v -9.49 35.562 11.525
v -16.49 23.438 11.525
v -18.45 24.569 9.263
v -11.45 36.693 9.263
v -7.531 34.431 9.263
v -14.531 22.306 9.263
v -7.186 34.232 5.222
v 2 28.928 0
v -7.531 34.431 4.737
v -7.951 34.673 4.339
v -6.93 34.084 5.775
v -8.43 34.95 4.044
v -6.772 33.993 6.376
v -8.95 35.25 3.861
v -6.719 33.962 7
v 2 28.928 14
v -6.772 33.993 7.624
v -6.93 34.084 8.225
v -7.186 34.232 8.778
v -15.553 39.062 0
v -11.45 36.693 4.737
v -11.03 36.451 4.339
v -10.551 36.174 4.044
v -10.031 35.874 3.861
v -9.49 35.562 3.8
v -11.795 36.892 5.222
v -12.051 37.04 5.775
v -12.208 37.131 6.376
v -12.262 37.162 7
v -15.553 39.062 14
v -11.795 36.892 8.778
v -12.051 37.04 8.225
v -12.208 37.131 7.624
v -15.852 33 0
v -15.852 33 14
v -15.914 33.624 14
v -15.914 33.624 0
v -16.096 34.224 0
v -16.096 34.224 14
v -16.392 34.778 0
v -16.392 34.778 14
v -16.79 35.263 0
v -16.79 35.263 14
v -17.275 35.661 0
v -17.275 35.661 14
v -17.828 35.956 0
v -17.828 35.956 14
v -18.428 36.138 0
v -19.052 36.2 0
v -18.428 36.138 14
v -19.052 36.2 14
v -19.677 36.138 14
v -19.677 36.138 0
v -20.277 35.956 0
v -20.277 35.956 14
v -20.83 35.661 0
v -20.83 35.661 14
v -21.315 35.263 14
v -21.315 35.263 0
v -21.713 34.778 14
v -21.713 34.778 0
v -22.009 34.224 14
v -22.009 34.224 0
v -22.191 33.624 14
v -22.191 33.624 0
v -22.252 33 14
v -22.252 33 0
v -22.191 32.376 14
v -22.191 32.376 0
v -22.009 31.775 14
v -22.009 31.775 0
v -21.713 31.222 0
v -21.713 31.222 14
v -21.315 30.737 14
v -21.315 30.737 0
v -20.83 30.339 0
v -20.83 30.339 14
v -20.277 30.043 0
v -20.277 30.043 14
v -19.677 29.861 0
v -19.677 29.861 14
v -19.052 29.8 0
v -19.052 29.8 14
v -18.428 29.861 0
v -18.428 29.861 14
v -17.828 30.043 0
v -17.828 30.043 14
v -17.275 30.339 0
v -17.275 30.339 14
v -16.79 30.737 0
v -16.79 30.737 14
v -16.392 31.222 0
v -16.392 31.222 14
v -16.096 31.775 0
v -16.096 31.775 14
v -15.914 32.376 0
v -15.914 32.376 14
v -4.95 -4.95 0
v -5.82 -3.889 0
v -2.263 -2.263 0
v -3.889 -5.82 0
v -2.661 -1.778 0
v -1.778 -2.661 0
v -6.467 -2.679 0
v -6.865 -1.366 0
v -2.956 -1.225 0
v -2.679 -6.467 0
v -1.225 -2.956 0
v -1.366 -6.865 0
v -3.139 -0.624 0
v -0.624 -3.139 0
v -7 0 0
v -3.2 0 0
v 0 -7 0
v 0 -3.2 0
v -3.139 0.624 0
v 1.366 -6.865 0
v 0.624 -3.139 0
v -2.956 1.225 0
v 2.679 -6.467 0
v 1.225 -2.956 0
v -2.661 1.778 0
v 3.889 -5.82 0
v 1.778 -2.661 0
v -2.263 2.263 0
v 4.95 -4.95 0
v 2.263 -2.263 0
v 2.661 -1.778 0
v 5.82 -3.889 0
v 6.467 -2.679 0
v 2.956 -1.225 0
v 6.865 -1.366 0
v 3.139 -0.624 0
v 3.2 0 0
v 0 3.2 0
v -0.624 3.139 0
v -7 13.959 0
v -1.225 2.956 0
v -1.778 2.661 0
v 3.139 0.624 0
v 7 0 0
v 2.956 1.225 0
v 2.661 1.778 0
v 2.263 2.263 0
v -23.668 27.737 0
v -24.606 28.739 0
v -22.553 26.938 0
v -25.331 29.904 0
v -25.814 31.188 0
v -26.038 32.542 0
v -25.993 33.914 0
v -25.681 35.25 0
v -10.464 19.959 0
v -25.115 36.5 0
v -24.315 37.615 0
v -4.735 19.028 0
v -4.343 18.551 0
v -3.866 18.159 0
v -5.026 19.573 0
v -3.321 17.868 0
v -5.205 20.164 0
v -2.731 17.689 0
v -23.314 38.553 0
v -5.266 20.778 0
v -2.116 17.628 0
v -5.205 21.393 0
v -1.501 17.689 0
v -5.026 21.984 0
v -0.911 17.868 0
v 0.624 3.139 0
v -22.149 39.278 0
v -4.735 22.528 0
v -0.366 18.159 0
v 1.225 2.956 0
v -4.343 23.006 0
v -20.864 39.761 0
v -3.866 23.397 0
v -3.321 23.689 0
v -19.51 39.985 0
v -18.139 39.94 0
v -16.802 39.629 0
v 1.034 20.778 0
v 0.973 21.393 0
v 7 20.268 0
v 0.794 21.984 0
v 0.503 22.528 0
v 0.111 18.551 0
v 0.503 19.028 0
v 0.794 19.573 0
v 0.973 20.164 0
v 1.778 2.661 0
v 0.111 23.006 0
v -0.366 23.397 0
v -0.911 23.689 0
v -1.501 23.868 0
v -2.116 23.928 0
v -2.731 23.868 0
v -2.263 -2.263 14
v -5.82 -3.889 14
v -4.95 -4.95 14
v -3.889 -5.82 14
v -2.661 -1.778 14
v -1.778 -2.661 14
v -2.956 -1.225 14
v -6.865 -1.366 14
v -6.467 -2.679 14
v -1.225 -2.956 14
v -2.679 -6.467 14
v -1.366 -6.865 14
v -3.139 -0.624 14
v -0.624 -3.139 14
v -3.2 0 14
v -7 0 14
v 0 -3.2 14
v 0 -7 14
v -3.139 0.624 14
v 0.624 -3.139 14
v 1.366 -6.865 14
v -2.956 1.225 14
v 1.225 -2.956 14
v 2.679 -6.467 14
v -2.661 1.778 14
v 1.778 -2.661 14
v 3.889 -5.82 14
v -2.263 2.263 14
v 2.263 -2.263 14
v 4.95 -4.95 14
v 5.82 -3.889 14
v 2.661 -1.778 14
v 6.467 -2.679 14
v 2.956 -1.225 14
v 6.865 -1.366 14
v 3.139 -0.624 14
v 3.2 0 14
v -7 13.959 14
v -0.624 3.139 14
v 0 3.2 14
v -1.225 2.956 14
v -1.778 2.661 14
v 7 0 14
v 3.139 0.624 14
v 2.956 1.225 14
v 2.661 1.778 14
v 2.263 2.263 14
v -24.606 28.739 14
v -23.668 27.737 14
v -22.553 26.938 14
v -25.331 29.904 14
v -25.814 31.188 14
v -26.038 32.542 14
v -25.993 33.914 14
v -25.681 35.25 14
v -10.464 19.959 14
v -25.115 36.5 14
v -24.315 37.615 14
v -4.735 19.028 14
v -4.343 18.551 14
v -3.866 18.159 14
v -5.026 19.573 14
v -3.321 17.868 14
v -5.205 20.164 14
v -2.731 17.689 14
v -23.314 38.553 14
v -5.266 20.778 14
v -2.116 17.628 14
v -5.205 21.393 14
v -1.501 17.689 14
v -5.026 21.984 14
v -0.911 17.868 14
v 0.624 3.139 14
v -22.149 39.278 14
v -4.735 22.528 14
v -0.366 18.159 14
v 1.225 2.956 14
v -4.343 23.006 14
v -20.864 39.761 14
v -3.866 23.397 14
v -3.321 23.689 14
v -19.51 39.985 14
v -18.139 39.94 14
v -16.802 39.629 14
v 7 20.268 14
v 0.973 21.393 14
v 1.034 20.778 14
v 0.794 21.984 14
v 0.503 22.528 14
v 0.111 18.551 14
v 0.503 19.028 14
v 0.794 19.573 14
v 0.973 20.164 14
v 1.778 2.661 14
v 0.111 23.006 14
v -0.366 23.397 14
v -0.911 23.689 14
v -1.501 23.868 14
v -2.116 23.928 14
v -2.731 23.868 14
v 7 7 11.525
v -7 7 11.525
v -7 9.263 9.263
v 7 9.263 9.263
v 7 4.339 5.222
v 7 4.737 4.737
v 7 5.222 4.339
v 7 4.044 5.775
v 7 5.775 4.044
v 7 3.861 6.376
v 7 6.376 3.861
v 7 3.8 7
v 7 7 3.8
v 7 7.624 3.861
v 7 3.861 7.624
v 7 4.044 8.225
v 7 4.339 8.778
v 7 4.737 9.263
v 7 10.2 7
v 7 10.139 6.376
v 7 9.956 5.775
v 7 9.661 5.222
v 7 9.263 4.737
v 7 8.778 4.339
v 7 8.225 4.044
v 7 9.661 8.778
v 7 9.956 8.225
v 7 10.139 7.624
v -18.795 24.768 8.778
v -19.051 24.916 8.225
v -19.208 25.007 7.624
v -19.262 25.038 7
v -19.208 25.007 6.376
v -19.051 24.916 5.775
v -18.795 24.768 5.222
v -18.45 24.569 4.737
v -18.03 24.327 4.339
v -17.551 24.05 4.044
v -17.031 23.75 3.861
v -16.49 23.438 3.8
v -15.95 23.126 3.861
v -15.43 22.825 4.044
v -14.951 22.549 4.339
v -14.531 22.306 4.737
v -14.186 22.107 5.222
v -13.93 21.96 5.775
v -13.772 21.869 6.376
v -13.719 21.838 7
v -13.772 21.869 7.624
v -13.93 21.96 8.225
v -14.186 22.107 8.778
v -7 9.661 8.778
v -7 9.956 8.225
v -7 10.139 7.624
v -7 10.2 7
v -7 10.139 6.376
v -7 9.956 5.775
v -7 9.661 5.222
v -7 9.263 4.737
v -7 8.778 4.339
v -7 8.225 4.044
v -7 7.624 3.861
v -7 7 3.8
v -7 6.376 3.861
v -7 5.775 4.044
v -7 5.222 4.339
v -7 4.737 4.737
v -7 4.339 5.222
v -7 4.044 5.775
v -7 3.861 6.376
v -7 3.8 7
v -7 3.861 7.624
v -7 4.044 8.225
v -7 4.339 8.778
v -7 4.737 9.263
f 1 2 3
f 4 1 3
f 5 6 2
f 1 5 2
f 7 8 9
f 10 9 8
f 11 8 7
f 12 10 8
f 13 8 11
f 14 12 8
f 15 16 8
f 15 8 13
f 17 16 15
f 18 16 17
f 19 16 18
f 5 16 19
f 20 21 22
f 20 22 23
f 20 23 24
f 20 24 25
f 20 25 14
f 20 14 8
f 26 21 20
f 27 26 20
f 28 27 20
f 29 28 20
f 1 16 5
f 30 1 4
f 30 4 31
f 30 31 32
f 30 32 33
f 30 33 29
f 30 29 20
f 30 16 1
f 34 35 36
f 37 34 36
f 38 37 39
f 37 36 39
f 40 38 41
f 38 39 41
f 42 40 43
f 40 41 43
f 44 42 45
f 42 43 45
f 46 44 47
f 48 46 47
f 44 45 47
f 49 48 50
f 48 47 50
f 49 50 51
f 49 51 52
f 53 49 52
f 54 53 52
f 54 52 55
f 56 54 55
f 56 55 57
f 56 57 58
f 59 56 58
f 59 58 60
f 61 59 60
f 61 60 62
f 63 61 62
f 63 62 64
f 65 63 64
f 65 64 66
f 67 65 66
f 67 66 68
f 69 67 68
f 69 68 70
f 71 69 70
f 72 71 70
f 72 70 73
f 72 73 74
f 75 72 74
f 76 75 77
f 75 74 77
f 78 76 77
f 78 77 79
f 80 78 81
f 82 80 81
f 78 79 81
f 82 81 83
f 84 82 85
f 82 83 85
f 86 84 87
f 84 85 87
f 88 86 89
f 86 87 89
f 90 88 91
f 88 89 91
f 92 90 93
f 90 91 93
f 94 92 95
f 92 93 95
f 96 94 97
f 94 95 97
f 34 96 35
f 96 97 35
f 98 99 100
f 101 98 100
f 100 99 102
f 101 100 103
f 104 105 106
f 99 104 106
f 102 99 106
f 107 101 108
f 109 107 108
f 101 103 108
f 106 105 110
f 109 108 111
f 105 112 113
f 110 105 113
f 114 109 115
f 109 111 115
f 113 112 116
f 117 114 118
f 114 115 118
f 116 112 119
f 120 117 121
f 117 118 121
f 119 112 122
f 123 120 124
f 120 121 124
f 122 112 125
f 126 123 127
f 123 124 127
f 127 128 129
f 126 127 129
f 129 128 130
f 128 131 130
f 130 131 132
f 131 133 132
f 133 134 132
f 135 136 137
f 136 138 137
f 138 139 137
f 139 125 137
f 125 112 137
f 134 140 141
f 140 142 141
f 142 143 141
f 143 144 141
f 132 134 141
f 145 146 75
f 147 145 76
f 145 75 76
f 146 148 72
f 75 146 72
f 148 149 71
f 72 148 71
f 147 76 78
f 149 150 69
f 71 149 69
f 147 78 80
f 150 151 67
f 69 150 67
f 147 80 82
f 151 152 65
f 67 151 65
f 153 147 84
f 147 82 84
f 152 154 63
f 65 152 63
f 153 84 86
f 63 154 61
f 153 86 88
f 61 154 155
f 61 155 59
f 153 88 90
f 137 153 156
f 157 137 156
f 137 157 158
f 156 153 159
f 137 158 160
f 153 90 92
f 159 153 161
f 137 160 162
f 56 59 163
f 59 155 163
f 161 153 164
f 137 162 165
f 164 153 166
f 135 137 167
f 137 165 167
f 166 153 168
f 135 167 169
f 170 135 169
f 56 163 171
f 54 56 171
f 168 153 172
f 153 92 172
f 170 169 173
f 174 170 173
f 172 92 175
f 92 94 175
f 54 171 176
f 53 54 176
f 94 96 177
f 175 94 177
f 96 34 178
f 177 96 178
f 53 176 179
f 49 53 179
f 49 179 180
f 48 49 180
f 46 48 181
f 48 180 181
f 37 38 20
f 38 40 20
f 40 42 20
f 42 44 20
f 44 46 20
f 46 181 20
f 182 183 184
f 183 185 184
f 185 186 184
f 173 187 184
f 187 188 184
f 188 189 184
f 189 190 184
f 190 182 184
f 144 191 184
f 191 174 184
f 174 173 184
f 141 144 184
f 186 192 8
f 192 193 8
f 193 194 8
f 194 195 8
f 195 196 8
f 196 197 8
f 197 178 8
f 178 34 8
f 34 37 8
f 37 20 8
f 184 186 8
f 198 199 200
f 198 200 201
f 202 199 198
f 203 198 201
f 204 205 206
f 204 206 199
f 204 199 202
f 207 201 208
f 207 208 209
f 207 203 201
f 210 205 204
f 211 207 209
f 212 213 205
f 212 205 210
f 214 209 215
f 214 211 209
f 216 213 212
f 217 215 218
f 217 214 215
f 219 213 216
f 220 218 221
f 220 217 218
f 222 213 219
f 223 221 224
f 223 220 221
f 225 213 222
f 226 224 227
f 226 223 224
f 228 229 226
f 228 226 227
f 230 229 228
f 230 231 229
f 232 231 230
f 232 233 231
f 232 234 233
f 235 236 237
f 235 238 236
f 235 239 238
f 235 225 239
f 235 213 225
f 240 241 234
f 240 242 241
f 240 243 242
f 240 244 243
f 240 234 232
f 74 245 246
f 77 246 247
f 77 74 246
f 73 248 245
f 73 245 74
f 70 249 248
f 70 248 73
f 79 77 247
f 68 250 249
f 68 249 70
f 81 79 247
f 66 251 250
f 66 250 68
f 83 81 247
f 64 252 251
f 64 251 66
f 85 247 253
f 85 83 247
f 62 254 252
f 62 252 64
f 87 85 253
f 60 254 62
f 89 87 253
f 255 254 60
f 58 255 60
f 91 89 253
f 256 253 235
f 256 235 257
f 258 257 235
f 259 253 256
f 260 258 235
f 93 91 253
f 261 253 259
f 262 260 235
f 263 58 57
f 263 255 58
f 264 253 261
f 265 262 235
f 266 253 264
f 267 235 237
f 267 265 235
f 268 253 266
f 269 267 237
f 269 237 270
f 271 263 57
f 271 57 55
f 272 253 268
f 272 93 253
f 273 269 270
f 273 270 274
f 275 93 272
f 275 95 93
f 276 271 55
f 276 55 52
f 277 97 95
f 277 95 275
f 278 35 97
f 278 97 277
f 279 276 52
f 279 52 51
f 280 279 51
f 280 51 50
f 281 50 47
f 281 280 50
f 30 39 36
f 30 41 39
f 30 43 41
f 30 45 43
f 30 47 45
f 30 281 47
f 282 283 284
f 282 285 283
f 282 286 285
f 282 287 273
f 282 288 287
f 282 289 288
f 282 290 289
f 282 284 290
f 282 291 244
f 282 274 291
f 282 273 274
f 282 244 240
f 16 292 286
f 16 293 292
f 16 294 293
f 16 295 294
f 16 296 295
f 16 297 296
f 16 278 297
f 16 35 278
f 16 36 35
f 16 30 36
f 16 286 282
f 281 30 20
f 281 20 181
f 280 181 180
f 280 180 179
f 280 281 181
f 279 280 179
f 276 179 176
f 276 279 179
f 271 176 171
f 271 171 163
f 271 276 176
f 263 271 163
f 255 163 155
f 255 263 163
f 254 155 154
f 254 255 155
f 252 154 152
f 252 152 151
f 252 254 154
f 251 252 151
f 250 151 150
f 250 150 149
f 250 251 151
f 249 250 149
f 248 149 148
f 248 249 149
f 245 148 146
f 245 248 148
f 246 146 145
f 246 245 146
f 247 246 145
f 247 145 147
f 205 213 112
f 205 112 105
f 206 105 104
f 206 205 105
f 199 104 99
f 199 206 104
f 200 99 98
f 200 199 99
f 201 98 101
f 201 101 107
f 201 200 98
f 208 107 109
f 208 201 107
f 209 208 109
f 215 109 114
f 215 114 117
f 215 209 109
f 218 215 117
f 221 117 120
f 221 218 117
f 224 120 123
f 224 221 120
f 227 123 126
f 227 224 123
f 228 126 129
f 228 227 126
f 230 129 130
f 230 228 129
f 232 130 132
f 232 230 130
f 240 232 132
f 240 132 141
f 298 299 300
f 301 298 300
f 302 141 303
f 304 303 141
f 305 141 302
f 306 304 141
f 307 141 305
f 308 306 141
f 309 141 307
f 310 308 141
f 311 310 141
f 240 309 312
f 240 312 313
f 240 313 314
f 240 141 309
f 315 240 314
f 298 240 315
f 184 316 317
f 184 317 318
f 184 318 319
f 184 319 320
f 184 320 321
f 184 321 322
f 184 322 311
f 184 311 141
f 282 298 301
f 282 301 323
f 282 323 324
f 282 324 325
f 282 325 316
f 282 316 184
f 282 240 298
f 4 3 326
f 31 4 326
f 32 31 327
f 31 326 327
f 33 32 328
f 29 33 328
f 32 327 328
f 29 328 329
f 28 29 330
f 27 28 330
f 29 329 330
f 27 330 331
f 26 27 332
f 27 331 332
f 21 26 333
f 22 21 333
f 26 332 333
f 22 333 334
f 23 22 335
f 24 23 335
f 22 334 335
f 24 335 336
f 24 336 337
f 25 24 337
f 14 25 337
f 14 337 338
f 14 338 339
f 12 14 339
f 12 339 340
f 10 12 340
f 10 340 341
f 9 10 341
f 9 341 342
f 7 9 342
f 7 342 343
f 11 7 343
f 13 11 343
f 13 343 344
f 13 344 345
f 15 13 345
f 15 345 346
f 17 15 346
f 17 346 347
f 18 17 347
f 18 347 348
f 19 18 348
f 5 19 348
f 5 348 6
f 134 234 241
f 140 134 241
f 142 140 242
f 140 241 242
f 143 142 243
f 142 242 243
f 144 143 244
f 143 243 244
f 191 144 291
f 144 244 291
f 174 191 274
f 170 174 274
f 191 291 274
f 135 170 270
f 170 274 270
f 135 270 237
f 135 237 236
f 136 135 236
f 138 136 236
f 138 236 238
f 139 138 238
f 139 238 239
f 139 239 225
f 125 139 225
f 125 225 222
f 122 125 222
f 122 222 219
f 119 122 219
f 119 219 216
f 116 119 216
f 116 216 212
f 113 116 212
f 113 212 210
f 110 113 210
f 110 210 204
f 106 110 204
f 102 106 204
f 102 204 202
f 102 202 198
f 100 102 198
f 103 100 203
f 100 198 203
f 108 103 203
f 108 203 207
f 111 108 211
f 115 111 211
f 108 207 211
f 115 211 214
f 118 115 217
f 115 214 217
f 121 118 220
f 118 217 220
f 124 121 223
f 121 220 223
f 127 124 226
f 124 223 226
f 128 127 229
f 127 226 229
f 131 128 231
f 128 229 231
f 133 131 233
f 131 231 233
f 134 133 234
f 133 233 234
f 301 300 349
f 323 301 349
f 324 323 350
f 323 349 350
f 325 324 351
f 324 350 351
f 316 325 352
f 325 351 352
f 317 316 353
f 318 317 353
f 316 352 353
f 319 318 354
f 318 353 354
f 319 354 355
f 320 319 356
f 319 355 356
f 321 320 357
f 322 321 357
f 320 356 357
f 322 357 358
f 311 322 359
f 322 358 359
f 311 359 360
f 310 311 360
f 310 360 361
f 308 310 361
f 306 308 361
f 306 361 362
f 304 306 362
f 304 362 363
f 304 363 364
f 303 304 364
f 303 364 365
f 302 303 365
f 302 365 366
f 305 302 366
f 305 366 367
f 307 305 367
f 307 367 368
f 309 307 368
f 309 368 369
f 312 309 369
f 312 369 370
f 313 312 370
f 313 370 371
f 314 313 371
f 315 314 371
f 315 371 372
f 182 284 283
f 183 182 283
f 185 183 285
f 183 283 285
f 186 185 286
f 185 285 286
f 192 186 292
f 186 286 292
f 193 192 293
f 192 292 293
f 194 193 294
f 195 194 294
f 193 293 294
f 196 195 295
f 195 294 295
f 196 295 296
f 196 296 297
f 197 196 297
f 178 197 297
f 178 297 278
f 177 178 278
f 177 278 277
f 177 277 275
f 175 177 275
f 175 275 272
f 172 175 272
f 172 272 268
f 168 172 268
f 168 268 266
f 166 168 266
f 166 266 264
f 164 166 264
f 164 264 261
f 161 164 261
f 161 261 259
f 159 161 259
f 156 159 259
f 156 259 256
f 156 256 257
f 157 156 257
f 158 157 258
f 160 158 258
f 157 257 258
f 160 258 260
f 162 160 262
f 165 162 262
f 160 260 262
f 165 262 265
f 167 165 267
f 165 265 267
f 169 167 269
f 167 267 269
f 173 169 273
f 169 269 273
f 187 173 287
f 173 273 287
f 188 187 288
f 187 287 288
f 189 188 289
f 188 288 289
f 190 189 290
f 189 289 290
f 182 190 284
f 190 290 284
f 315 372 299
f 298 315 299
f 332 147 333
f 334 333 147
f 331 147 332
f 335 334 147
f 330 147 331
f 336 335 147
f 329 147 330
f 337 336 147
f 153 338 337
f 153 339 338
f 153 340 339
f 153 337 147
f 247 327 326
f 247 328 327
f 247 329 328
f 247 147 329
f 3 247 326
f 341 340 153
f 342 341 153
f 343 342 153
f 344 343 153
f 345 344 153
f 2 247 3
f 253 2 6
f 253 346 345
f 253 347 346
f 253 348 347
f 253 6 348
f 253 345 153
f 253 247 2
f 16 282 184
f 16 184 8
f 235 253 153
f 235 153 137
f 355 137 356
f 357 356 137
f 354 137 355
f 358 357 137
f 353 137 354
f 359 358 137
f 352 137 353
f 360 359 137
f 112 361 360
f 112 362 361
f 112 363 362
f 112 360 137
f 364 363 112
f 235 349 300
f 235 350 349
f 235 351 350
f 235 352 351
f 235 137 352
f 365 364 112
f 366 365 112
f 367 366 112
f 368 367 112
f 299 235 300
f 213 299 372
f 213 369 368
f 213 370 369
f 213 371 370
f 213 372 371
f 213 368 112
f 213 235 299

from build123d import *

# Parameters (mm, degrees)
BOSS_EXTRUDE1_DEPTH = 14
HOLE1_D             = 6.4
HOLE1_DEPTH         = 14
HOLE2_D             = 6.4
HOLE2_DEPTH         = 14
CUT_EXTRUDE1_DEPTH  = 27.088457268
CUT_EXTRUDE2_DEPTH  = 15
SKETCH8_R           = 3.15
CUT_EXTRUDE3_DEPTH  = 15


with BuildPart() as part:
    # Sketch1 → Boss-Extrude1 (new body)
    with BuildSketch(Plane.XY.offset(14)):
        with BuildLine():
            Line((7, 0), (7, 20.267949192))
            Line((7, 20.267949192), (2, 28.92820323))
            Line((2, 28.92820323), (-15.552558883, 39.062177826))
            ThreePointArc((-15.552558883, 39.062177826), (-25.11473671, 36.5), (-22.552558883, 26.937822174))
            Line((-22.552558883, 26.937822174), (-10.464101615, 19.958548116))
            Line((-10.464101615, 19.958548116), (-7, 13.958548116))
            Line((-7, 13.958548116), (-7, 0))
            ThreePointArc((-7, 0), (0, -7), (7, 0))
        make_face()
    extrude(amount=-BOSS_EXTRUDE1_DEPTH)

    # Hole1
    with Locations(Plane(origin=(0, 0, 0), x_dir=(-1, 0, 0), z_dir=(0, 0, -1))):
        with Locations((0, 0)):
            Hole(HOLE1_D / 2, depth=HOLE1_DEPTH)

    # Hole2
    with Locations(Plane(origin=(0, 0, 0), x_dir=(-1, 0, 0), z_dir=(0, 0, -1))):
        with Locations((19.0525, 32.999898011)):
            Hole(HOLE2_D / 2, depth=HOLE2_DEPTH)

    # Sketch2 → Cut-Extrude1 (cut, through all)
    with BuildSketch(Plane(origin=(6.026279442, 10.437822174, 0), x_dir=(0.866025404, -0.5, 0), z_dir=(-0.5, -0.866025404, 0))):
        with BuildLine():
            Line((-25.999898011, 11.5254834), (-28.262639711, 9.2627417))
            ThreePointArc((-28.262639711, 9.2627417), (-25.999898011, 3.8), (-23.737156311, 9.2627417))
            Line((-23.737156311, 9.2627417), (-25.999898011, 11.5254834))
        make_face()
    extrude(amount=-CUT_EXTRUDE1_DEPTH, mode=Mode.SUBTRACT)

    # Sketch3 → Cut-Extrude2 (cut, through all)
    with BuildSketch(Plane.ZY.offset(7)):
        with BuildLine():
            Line((9.2627417, 4.7372583), (11.5254834, 7))
            Line((11.5254834, 7), (9.2627417, 9.2627417))
            ThreePointArc((9.2627417, 9.2627417), (3.8, 7), (9.2627417, 4.7372583))
        make_face()
    extrude(amount=-CUT_EXTRUDE2_DEPTH, mode=Mode.SUBTRACT)

    # Sketch8 → Cut-Extrude3 (cut, through all)
    with BuildSketch(Plane.XY.offset(14)):
        with Locations((-2.116025404, 20.778312164)):
            Circle(SKETCH8_R)
    extrude(amount=-CUT_EXTRUDE3_DEPTH, mode=Mode.SUBTRACT)


solid = part.part
